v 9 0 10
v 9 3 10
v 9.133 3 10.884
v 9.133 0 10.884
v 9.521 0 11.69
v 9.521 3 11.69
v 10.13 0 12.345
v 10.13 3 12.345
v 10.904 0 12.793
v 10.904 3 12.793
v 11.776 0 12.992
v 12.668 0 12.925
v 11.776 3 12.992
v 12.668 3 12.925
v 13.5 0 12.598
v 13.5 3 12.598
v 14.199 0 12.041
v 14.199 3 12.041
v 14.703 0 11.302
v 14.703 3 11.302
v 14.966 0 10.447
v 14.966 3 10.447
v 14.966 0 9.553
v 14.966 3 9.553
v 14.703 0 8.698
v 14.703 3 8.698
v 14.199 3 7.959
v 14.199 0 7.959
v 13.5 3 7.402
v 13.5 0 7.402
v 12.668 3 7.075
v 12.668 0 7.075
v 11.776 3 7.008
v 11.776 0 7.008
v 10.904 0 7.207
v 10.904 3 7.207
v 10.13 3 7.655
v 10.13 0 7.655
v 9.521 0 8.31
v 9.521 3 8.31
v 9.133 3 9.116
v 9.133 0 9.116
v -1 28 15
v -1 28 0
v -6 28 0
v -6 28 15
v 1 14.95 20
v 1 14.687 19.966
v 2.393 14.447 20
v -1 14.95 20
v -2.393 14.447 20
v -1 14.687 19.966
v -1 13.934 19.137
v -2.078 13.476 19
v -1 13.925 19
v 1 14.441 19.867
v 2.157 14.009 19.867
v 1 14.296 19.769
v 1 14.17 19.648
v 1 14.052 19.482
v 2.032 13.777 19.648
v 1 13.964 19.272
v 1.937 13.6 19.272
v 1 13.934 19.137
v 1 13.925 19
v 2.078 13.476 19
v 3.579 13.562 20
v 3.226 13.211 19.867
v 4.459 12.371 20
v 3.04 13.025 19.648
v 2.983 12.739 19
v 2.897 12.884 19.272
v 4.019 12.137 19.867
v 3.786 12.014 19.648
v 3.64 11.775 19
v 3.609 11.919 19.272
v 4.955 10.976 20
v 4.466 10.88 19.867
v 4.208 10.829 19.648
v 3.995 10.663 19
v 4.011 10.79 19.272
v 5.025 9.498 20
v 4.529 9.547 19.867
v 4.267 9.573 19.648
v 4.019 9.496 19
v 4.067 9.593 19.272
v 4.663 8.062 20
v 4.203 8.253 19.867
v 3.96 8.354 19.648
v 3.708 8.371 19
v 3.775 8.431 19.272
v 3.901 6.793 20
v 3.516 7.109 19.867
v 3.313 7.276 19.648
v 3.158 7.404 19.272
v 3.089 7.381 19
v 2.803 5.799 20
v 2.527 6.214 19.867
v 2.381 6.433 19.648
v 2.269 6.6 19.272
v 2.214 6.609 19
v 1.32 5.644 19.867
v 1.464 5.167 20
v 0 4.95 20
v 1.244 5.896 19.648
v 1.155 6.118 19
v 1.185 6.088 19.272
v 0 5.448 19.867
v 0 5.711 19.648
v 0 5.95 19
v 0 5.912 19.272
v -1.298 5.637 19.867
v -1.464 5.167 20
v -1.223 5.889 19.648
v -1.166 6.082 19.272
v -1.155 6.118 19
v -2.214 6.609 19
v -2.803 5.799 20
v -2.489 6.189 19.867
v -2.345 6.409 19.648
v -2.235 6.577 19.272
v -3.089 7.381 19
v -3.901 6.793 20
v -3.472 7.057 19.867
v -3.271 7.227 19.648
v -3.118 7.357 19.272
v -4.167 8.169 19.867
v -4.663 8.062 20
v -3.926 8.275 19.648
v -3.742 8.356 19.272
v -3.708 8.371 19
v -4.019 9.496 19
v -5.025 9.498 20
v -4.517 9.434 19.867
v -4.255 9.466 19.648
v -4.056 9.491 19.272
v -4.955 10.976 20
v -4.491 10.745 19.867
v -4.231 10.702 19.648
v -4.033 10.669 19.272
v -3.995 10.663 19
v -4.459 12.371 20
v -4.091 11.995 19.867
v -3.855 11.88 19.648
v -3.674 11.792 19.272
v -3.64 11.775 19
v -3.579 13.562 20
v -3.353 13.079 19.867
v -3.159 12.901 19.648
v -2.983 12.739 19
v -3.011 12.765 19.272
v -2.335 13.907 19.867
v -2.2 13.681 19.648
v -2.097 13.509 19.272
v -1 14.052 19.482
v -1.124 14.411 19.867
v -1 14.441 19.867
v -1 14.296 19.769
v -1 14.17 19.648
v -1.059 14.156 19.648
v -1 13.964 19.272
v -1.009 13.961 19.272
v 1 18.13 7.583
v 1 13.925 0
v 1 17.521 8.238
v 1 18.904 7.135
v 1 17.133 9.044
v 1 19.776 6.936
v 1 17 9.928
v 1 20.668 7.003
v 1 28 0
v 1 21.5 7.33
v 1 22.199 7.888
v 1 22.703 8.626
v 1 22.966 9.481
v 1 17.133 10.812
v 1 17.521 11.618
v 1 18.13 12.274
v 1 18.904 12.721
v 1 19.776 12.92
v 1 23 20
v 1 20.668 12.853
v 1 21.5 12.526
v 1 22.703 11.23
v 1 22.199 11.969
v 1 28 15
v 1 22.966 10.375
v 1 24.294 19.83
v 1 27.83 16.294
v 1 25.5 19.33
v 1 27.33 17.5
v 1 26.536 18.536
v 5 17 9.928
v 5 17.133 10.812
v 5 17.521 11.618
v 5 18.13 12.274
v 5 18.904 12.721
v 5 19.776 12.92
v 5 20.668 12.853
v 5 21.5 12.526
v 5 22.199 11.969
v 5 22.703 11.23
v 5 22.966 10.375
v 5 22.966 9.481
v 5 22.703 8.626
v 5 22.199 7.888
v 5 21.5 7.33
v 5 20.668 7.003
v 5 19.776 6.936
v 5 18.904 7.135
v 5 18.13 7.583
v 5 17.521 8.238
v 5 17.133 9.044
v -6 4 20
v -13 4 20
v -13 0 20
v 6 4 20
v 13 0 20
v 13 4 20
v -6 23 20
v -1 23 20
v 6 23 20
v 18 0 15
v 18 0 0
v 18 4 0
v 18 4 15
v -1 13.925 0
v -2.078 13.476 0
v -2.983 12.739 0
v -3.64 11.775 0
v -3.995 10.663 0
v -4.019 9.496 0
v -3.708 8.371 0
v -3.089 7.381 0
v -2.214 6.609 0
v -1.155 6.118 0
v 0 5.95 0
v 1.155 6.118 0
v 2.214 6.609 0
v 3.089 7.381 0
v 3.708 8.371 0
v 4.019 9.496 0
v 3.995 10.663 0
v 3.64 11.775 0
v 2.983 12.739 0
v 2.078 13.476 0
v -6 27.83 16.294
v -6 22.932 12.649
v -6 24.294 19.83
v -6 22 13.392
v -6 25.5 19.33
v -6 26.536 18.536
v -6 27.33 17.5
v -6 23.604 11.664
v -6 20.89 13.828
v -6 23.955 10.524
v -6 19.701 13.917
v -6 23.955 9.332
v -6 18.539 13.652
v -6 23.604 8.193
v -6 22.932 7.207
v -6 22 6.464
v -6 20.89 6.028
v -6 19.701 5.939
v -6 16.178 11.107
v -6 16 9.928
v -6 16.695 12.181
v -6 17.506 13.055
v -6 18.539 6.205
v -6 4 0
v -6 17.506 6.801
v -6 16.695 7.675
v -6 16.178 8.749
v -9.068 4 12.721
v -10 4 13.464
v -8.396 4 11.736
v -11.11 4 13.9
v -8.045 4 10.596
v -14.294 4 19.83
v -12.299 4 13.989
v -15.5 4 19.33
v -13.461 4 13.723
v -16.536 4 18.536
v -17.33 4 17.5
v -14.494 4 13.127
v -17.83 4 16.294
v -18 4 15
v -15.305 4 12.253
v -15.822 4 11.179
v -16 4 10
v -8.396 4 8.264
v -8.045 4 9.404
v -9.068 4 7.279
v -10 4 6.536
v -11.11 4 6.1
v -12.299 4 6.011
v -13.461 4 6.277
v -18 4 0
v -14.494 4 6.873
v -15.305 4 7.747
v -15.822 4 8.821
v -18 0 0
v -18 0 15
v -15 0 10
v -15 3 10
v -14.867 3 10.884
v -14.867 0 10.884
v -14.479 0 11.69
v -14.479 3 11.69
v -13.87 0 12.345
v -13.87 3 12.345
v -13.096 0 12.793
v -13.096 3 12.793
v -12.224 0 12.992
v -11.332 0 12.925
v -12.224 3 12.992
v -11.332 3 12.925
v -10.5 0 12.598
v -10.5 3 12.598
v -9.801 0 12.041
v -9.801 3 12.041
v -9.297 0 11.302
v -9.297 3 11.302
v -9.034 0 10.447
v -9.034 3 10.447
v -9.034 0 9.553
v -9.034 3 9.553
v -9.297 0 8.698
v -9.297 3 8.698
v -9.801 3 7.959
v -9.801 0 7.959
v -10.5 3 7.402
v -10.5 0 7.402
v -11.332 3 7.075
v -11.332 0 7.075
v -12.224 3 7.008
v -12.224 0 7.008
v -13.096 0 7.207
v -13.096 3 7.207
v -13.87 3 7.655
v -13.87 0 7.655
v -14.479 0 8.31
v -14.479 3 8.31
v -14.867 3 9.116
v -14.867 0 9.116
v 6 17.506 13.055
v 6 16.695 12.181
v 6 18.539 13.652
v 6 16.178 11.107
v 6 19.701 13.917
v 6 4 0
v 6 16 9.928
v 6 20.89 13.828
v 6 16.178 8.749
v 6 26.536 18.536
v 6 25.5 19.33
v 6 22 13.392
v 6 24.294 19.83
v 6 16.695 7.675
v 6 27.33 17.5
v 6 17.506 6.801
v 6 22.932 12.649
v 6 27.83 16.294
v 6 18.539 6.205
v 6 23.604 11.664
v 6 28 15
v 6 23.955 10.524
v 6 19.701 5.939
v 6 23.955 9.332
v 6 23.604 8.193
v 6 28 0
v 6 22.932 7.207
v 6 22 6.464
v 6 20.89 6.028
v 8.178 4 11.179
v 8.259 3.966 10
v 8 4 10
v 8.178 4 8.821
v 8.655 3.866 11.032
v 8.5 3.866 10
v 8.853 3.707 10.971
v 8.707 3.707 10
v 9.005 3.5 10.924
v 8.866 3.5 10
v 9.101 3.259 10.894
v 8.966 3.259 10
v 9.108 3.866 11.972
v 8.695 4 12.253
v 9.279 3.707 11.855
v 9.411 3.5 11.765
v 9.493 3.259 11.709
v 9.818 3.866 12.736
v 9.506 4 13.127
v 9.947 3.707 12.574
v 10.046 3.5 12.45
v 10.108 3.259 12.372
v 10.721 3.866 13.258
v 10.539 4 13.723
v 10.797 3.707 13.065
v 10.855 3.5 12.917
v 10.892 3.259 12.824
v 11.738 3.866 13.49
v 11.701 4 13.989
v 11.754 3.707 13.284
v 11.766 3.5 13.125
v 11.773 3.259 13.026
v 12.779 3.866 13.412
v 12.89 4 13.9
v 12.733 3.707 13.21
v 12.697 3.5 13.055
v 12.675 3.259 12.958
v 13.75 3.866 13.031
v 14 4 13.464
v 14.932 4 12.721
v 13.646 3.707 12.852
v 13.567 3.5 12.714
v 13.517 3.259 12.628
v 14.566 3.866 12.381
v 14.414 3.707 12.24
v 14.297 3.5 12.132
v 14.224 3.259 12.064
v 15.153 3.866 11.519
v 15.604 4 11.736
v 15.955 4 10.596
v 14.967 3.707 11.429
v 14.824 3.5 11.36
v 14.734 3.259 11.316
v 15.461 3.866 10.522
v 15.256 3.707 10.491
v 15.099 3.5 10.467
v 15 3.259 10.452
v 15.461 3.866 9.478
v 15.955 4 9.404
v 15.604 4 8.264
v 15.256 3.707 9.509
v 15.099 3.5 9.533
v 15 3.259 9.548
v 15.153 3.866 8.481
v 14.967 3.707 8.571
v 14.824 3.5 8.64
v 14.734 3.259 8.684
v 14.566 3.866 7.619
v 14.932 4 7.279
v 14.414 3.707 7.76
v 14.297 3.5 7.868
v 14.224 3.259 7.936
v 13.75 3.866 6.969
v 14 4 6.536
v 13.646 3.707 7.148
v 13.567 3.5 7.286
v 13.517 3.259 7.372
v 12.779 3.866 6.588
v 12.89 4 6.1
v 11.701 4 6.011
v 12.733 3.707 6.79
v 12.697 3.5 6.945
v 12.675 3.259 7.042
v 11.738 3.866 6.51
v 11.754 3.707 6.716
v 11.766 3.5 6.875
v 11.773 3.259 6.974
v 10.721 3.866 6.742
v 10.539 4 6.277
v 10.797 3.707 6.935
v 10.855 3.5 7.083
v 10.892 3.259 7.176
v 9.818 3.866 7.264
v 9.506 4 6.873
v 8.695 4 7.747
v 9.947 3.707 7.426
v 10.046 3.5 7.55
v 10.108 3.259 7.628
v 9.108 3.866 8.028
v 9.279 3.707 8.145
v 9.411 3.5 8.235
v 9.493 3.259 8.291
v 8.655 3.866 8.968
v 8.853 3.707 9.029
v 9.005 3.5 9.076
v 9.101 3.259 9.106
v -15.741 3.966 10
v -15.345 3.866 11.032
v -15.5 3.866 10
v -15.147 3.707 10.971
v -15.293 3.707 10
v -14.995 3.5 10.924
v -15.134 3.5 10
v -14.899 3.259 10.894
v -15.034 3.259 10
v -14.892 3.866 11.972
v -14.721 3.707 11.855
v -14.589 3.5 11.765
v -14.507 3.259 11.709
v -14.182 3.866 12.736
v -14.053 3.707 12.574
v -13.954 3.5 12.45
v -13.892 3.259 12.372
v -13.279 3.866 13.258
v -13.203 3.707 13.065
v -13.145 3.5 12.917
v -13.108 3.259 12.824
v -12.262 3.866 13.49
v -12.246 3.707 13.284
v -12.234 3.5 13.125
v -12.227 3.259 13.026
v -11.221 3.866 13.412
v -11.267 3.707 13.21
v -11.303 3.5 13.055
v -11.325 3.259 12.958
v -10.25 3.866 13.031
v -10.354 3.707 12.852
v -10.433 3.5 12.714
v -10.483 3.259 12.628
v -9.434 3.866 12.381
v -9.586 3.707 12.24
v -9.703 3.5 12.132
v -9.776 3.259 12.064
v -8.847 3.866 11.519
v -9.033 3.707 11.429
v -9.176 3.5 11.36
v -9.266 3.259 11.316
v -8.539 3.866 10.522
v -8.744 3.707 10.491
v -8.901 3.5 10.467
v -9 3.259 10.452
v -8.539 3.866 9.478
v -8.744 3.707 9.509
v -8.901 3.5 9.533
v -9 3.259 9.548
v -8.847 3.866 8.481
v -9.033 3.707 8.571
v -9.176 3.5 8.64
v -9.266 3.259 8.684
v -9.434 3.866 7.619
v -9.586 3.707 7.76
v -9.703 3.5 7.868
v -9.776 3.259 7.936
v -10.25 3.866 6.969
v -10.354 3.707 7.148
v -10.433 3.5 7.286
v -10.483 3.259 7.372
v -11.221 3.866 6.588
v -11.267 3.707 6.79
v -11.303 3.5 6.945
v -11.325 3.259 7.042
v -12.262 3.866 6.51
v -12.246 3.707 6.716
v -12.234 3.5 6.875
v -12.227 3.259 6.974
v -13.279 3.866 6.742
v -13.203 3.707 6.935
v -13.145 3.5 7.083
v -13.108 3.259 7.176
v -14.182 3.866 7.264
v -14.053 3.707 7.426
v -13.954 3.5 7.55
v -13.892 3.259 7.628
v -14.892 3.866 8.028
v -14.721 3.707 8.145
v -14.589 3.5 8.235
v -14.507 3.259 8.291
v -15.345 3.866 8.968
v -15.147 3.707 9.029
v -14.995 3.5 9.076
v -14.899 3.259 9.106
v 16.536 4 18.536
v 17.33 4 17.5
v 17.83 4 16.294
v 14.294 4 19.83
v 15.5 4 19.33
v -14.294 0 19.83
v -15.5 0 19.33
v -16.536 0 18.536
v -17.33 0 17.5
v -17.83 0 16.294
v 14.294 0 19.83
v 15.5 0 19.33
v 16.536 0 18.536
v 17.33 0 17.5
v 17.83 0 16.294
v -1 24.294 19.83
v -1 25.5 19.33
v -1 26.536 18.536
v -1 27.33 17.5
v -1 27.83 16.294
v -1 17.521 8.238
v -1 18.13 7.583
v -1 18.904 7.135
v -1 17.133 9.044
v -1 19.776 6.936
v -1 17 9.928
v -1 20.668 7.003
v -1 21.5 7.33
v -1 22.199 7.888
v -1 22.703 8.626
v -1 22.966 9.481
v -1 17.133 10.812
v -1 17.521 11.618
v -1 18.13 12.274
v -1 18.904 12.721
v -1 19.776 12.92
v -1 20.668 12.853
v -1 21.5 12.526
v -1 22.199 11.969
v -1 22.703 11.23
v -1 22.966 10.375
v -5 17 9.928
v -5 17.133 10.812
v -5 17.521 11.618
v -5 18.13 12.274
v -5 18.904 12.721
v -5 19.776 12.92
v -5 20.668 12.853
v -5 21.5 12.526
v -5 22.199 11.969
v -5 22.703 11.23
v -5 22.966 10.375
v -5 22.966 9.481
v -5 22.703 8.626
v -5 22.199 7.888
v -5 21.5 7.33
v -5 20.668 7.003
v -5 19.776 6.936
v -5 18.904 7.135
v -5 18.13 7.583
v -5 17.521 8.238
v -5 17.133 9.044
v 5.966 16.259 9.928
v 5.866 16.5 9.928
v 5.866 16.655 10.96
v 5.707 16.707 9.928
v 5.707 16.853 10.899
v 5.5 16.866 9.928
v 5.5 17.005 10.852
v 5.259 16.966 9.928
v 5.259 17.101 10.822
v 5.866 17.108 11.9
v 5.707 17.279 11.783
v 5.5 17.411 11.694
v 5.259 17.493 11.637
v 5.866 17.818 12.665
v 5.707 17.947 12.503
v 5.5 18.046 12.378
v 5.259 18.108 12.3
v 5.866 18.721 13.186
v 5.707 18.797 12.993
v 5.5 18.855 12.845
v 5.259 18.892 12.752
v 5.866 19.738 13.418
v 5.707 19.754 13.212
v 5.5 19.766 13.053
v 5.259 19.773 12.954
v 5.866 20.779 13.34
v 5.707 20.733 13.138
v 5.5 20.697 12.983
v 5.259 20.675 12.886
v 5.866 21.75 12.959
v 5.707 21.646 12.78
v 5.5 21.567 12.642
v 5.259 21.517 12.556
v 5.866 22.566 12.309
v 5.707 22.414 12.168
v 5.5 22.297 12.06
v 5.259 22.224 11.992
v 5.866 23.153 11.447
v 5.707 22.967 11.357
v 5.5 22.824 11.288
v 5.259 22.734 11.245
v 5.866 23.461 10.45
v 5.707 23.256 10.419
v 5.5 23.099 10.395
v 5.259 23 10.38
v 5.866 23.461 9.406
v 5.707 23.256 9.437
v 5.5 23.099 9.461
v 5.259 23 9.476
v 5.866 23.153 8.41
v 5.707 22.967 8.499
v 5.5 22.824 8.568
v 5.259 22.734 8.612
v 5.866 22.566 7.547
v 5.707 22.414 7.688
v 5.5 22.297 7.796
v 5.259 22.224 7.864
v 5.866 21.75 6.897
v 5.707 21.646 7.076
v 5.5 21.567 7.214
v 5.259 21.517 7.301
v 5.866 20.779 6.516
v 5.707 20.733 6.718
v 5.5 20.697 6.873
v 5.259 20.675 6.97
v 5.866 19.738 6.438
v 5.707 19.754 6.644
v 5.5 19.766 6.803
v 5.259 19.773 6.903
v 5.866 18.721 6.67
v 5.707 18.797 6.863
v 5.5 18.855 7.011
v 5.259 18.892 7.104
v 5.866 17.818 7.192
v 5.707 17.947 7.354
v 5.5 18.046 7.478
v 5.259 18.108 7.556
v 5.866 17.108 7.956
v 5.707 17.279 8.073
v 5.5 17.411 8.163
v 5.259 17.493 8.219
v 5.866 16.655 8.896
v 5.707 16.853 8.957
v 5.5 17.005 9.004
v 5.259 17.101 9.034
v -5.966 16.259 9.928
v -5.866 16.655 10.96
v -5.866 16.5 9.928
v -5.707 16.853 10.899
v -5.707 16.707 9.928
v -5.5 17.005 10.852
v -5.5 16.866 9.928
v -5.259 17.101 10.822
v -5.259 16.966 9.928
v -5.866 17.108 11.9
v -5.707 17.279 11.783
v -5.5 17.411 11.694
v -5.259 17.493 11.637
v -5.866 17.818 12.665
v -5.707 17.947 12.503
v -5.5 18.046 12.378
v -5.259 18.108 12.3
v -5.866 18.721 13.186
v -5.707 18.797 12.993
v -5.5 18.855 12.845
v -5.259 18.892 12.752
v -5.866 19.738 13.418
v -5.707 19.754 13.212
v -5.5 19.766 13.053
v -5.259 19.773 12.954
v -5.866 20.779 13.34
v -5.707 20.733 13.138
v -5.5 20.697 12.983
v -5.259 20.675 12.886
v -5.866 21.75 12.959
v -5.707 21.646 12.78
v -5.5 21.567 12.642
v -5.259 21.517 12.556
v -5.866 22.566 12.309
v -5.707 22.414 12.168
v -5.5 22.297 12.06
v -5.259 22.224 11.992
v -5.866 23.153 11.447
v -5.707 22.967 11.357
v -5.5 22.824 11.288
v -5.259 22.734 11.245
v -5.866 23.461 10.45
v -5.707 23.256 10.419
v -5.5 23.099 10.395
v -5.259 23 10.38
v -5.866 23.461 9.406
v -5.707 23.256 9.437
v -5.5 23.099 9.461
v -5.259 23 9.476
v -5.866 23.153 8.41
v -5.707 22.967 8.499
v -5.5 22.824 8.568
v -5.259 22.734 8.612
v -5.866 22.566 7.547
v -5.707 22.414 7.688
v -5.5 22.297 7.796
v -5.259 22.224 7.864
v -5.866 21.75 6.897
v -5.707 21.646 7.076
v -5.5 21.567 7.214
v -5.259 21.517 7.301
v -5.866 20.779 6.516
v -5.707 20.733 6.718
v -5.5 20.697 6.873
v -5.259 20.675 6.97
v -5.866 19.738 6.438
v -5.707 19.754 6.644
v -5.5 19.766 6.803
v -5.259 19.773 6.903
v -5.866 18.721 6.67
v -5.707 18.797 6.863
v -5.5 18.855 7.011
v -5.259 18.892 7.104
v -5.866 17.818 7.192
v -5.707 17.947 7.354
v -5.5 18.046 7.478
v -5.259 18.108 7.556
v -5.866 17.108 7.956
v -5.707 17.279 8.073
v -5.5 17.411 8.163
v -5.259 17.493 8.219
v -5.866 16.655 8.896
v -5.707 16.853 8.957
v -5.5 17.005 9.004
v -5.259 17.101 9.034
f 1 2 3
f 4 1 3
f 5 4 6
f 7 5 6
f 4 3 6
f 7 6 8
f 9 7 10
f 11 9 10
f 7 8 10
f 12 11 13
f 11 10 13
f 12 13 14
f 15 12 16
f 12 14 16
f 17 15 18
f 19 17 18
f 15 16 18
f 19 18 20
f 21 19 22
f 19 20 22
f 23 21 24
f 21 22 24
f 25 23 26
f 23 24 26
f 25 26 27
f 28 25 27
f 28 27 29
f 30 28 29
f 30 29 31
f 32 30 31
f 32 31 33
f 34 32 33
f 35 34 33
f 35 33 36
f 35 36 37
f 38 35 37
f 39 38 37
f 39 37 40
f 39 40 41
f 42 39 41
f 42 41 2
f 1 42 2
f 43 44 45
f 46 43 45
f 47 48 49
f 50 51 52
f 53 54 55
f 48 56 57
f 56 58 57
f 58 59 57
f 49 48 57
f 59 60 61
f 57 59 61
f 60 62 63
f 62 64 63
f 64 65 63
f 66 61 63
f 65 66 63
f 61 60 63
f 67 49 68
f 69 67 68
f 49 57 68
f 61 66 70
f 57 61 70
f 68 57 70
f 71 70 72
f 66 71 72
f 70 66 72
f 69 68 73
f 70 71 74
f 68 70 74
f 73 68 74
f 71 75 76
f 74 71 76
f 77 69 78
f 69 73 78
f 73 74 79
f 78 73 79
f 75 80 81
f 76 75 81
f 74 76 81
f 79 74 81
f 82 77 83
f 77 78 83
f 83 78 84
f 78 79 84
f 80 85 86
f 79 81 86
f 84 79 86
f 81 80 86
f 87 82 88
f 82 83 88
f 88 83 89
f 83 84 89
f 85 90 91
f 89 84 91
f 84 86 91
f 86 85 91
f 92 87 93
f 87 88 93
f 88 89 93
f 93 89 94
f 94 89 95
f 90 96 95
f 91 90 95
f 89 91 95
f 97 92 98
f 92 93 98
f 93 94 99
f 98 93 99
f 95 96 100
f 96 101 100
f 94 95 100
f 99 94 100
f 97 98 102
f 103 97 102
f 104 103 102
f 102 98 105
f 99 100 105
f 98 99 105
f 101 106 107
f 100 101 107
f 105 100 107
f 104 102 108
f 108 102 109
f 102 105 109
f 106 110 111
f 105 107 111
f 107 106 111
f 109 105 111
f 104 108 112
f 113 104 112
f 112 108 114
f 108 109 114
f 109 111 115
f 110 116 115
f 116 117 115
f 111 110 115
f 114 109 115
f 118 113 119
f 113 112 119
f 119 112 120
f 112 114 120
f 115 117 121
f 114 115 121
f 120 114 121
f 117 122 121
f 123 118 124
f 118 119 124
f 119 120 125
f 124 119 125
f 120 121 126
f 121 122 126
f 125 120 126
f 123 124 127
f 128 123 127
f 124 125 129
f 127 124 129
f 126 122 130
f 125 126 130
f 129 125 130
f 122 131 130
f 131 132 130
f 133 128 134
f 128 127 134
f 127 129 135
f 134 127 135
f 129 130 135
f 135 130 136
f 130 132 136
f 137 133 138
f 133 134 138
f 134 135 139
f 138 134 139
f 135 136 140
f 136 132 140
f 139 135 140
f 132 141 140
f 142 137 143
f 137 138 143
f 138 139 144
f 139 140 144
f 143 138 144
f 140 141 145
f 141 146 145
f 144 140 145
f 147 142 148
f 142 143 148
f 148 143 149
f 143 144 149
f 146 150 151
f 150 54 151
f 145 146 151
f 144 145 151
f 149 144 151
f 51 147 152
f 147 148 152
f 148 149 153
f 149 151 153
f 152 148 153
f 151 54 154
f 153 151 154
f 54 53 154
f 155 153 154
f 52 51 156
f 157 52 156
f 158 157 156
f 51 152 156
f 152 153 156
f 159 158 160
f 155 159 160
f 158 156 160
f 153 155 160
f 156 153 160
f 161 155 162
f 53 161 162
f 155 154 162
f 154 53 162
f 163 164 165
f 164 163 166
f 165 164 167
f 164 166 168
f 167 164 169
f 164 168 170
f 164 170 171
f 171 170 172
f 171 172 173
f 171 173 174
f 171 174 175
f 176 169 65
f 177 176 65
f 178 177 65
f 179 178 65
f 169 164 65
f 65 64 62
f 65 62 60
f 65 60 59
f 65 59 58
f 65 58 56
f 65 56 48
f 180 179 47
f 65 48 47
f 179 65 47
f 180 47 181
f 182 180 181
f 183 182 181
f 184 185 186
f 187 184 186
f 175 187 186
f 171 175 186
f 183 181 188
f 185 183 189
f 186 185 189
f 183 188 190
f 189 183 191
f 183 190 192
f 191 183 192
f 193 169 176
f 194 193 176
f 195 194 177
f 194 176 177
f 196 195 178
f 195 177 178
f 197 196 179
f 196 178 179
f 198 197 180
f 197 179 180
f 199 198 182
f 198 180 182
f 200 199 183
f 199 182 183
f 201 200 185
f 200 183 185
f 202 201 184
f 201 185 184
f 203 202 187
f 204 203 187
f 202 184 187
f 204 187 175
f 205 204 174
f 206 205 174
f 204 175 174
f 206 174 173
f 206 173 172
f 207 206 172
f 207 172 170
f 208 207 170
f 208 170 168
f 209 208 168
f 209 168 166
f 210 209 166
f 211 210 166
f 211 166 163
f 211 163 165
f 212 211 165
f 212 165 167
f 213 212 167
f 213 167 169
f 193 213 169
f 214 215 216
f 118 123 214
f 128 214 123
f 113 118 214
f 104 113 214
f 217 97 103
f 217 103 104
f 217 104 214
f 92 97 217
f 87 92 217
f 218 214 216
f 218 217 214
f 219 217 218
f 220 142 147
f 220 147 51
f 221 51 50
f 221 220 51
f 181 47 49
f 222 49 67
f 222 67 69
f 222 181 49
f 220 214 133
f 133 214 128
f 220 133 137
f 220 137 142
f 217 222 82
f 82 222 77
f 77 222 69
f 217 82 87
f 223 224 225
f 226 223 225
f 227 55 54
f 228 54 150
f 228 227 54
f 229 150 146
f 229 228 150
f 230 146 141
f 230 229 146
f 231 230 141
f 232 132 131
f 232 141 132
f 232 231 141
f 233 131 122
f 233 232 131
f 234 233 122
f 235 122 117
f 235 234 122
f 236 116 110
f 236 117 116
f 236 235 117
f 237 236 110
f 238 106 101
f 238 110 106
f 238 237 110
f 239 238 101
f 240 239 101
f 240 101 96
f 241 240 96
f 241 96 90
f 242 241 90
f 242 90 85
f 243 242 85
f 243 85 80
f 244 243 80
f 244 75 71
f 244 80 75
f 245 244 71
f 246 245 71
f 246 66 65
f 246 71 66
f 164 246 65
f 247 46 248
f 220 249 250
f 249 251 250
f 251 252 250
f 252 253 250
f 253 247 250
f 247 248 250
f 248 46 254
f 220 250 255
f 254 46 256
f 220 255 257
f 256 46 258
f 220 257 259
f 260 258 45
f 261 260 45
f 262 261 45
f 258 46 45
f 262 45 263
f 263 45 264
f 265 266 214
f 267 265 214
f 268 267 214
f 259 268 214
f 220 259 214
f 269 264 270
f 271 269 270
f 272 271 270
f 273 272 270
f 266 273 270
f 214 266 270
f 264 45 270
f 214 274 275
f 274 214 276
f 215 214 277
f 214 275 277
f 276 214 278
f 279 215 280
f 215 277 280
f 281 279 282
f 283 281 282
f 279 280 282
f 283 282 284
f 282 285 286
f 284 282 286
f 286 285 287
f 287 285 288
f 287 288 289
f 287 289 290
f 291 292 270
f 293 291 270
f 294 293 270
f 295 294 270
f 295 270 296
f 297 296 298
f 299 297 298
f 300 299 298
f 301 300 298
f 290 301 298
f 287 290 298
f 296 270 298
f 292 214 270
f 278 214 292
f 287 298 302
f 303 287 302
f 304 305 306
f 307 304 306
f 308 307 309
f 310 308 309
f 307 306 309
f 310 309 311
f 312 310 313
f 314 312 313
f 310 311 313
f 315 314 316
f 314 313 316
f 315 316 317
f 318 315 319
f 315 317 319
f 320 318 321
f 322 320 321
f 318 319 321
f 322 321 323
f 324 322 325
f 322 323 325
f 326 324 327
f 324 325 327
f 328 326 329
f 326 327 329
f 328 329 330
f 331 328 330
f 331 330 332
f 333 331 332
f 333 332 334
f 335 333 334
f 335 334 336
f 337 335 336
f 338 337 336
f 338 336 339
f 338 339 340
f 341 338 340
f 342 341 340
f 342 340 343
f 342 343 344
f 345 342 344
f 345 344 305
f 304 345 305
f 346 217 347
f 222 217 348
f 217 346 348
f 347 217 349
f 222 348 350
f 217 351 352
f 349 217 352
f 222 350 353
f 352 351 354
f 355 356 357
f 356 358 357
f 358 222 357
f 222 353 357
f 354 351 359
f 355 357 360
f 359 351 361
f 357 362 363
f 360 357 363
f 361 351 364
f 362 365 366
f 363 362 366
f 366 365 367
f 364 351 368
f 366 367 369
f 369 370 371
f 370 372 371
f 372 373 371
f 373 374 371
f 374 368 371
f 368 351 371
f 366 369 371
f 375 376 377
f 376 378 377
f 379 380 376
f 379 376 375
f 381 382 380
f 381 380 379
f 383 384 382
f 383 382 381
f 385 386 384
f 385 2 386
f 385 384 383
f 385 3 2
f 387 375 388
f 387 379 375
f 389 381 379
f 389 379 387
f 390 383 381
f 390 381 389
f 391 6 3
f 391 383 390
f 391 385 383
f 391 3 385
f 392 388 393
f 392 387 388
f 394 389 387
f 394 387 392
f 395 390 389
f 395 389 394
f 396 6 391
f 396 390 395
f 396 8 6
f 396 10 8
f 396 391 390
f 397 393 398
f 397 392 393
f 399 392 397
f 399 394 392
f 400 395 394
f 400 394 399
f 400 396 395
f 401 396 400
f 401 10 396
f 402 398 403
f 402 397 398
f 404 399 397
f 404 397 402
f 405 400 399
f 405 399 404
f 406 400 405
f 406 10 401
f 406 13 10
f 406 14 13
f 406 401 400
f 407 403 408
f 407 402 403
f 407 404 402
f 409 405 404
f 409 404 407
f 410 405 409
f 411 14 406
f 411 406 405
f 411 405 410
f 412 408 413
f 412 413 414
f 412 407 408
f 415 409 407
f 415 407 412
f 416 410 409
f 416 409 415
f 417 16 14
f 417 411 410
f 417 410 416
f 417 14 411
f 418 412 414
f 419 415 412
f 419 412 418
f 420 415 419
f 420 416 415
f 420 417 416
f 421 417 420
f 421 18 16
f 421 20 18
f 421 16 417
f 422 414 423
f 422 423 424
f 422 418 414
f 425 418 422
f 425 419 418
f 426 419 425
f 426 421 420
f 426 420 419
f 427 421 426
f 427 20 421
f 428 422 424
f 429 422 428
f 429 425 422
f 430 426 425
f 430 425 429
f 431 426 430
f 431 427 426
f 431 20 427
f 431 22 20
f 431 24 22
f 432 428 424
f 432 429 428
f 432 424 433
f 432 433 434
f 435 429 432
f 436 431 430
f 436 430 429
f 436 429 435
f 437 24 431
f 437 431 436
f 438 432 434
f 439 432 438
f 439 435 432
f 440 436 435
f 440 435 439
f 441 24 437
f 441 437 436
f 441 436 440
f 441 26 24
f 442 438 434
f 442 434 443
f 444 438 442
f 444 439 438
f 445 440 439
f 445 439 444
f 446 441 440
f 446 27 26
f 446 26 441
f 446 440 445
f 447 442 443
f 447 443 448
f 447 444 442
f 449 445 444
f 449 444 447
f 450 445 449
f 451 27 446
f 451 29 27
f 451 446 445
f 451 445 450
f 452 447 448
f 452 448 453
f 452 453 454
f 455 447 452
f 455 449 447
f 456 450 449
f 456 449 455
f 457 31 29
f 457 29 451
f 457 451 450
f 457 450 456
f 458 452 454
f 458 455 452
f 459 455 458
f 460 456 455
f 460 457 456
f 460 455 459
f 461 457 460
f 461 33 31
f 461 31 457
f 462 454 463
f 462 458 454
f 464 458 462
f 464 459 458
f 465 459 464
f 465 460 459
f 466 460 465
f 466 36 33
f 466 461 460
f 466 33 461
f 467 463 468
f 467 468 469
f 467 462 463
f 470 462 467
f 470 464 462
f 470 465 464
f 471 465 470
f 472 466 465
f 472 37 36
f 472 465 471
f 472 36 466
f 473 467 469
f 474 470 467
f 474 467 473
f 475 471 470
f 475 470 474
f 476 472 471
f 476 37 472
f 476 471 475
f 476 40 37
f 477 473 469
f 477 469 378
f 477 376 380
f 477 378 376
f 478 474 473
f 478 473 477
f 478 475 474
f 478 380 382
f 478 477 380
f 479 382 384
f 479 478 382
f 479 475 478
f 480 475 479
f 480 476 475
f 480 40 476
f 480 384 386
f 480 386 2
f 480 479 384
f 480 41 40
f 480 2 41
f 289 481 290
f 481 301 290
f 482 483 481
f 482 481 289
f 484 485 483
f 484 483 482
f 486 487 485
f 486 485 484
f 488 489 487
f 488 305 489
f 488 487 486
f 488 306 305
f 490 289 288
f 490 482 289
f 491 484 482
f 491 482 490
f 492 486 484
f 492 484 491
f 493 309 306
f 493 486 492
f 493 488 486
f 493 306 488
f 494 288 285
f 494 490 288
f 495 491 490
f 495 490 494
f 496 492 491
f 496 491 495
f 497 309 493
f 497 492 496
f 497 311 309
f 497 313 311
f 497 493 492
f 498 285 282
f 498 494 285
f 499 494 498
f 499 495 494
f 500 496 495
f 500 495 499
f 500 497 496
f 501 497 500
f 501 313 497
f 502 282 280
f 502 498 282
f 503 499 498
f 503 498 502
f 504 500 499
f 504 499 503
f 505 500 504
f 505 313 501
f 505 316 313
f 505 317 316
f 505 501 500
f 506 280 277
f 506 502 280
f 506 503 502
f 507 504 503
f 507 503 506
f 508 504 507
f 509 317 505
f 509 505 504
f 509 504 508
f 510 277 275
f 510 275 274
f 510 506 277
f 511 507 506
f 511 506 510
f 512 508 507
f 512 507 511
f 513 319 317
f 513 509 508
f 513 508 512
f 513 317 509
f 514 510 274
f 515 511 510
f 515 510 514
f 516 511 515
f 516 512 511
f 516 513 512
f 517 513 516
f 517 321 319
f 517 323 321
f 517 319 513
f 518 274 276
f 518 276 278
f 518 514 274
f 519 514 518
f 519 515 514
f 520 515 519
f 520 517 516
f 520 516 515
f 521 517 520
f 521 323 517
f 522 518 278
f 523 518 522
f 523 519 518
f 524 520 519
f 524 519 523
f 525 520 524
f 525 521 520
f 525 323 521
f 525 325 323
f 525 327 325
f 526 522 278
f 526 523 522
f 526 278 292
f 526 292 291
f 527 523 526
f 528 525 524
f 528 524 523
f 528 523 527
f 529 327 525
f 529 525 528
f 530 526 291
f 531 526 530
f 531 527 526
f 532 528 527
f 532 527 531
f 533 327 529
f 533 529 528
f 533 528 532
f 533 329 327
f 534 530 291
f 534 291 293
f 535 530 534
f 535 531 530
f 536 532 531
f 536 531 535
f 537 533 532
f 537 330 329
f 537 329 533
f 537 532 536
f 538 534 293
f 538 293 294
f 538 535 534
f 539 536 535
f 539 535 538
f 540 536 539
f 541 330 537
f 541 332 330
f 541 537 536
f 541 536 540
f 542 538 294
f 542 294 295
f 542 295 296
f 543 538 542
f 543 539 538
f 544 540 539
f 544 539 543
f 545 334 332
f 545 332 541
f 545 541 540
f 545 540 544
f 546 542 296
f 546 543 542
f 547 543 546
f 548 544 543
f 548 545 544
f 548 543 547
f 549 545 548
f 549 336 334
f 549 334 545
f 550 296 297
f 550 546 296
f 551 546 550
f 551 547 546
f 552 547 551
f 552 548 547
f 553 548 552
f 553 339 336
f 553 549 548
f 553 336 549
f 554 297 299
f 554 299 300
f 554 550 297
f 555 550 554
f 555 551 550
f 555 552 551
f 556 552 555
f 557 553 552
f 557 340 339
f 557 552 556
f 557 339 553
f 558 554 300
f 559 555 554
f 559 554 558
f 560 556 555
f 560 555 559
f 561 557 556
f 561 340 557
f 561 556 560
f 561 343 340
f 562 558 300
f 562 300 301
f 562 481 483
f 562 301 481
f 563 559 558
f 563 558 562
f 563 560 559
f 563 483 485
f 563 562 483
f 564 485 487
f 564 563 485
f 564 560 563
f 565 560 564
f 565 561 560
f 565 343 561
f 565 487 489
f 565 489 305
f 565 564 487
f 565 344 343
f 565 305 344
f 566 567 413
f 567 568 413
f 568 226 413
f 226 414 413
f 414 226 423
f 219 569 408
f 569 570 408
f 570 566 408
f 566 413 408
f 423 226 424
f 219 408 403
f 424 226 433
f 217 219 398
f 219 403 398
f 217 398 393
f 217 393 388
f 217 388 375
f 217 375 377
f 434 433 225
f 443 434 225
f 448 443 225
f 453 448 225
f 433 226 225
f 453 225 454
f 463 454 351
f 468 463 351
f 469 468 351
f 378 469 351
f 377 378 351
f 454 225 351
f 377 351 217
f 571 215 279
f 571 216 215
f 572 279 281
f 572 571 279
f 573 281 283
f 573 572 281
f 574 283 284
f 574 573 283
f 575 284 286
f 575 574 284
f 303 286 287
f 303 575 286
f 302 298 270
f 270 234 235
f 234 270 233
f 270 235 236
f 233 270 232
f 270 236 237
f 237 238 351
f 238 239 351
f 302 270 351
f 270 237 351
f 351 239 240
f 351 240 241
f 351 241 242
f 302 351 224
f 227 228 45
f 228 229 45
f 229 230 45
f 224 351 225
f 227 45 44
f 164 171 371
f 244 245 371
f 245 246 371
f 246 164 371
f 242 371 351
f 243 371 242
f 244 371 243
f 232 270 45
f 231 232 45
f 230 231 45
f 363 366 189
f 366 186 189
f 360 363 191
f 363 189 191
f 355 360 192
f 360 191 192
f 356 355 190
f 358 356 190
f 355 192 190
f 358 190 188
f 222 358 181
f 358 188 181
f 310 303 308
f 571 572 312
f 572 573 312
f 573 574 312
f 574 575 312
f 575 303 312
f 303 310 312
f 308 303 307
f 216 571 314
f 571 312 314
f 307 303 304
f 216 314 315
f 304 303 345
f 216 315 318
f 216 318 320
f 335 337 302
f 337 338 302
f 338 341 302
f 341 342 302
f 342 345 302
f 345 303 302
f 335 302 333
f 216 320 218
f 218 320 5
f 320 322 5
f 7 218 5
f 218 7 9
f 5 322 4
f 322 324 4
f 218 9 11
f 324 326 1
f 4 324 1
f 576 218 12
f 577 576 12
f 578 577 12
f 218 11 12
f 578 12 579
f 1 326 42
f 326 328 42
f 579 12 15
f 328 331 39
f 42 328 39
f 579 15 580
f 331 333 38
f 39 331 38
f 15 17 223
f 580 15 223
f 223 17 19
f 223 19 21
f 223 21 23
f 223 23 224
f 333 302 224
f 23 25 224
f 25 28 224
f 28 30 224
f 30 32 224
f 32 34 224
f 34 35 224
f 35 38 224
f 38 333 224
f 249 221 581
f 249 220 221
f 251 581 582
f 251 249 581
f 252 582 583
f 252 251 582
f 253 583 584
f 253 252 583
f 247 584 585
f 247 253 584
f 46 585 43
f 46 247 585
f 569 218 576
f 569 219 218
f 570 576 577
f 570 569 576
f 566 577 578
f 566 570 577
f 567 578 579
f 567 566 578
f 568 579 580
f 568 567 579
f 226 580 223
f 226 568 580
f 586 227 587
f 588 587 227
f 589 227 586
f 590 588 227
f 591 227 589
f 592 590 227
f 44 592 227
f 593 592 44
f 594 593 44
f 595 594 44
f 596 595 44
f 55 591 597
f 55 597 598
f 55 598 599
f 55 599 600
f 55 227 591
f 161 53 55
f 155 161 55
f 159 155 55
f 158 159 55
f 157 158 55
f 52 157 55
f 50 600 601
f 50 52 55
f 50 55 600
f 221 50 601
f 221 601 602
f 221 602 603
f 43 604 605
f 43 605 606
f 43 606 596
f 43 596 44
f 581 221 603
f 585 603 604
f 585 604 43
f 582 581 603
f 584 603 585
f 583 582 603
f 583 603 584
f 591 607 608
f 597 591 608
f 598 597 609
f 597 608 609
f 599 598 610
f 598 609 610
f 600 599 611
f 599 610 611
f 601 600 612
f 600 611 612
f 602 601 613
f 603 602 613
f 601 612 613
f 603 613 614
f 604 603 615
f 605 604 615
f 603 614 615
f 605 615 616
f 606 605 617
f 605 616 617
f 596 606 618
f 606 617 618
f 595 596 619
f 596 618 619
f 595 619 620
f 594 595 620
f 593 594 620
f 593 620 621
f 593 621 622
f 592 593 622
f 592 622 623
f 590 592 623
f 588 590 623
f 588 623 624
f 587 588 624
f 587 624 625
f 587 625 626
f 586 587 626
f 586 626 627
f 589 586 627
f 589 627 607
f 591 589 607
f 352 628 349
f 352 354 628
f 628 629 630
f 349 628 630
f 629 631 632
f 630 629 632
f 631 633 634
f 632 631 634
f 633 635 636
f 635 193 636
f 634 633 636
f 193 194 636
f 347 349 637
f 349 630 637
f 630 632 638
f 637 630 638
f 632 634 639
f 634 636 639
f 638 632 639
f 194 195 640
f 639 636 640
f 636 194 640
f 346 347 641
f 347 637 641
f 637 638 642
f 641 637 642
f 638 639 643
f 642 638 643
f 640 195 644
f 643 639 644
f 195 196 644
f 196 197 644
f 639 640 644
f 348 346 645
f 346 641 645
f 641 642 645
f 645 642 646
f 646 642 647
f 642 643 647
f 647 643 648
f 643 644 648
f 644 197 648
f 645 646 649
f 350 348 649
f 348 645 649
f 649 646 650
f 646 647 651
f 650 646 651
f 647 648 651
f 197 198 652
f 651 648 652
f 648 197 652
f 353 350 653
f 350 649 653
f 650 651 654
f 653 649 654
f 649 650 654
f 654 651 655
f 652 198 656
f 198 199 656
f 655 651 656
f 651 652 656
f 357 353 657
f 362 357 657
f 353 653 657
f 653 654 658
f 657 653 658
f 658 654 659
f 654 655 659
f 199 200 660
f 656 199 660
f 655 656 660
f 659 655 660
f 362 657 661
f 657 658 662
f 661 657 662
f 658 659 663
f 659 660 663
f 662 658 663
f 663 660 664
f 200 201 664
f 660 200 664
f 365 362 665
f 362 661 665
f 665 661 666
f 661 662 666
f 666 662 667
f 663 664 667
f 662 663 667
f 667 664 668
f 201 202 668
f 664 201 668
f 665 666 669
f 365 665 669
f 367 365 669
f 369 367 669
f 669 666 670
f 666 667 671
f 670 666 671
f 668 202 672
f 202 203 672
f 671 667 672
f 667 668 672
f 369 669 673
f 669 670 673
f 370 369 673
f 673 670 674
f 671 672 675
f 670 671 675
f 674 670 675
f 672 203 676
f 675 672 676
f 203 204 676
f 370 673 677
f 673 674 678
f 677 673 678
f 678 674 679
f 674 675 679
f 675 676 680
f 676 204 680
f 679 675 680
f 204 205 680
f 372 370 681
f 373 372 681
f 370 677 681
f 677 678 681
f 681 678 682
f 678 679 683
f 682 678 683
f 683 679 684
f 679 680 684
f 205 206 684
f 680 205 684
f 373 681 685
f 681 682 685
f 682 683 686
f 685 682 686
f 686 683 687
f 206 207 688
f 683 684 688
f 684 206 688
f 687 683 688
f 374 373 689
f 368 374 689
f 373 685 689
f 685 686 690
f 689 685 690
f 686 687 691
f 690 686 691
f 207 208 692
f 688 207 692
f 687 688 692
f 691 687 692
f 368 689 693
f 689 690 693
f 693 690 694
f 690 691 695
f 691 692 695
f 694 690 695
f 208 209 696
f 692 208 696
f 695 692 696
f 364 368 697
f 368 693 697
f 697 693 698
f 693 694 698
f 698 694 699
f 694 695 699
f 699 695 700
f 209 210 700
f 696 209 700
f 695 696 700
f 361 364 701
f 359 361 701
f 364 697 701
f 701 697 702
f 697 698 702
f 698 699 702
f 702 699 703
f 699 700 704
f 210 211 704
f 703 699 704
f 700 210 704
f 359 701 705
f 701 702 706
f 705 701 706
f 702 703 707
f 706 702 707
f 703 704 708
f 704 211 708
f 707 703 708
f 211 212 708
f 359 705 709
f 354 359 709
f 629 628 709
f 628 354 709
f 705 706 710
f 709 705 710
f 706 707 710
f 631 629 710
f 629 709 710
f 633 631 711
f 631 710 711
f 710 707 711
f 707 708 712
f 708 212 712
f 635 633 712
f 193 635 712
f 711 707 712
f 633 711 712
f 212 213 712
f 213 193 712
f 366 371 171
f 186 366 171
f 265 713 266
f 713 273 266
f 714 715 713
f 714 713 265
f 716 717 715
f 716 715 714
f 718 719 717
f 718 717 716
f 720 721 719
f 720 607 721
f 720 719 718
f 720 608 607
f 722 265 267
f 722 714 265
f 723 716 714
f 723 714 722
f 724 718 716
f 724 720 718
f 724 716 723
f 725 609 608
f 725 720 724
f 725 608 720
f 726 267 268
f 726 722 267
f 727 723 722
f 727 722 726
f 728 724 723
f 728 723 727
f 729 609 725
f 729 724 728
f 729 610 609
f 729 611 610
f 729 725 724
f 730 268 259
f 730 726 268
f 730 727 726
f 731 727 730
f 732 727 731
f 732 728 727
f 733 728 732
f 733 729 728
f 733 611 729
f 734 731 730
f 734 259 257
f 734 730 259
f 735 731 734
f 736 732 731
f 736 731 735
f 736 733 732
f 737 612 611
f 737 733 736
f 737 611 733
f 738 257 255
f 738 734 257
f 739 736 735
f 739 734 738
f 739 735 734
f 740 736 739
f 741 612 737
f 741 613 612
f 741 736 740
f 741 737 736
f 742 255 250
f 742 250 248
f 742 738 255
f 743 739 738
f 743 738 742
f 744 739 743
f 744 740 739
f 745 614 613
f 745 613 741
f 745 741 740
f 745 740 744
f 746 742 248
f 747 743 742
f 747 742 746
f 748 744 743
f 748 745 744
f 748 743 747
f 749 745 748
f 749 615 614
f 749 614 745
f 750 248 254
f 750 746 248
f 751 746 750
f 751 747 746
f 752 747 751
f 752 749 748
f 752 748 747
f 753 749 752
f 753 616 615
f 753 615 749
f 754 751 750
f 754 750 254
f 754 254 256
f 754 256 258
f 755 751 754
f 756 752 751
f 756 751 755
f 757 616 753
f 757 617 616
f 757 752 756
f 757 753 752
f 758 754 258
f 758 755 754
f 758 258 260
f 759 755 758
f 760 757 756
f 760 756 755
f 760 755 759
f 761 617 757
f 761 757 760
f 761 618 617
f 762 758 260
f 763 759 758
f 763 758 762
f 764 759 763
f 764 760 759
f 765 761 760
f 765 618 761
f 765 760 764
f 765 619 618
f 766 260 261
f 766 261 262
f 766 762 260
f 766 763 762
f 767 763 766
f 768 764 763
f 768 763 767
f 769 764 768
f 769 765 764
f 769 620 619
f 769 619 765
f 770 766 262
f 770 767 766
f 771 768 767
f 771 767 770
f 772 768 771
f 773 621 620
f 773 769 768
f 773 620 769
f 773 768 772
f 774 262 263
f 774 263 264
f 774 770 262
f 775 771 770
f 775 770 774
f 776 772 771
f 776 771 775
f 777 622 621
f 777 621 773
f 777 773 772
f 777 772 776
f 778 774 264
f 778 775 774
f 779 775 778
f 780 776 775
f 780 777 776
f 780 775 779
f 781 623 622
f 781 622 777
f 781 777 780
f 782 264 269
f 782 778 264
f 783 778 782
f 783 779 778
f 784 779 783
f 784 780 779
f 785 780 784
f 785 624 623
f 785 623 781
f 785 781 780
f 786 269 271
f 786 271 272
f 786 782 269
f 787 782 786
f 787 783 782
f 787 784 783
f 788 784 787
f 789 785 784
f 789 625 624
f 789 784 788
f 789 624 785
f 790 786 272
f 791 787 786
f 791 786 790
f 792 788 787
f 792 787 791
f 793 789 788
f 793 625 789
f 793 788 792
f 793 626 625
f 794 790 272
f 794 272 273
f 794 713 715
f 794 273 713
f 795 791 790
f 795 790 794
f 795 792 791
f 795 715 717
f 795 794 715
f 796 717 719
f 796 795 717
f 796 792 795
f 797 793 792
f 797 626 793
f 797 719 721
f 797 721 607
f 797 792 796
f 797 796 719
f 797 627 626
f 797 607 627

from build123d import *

# Parameters (mm, degrees)
F0_R     = 4.05
F1_DEPTH = 20
F2_W     = 2
F2_H     = 25.5416983529
F3_DEPTH = 25
F4_R     = 3
F5_DEPTH = 25
F6_R     = 3
F7_DEPTH = 25
F8_R     = 5
F9_R     = 1


with BuildPart() as f1:
    # F0 (on Top) → F1 (new body)
    with BuildSketch(Plane.XY):
        Polygon((6, 28), (0, 28), (-6, 28), (-6, 4), (-18, 4), (-18, 0), (0, 0), (18, 0), (18, 4), (6, 4), align=None)
        with Locations((0, 10)):
            Circle(F0_R, mode=Mode.SUBTRACT)
    extrude(amount=F1_DEPTH)

    # F2 (on face) → F3 (cut)
    with BuildSketch(Plane.XY.offset(20)):
        with Locations((0, 21.3338027536)):
            Rectangle(F2_W, F2_H)
    extrude(amount=-F3_DEPTH, mode=Mode.SUBTRACT)

    # F4 (on face) → F5 (cut)
    with BuildSketch(Plane(origin=(-6, 0, 0), x_dir=(0, -1, 0), z_dir=(-1, 0, 0))):
        with Locations((-20, 9.9280960858)):
            Circle(F4_R)
    extrude(amount=-F5_DEPTH, mode=Mode.SUBTRACT)

    # F6 (on face) → F7 (cut)
    with BuildSketch(Plane(origin=(0, 4, 0), x_dir=(-1, 0, 0), z_dir=(0, 1, 0))):
        with Locations((12, 10)):
            Circle(F6_R)
        with Locations((-12, 10)):
            Circle(F6_R)
    extrude(amount=-F7_DEPTH, mode=Mode.SUBTRACT)

    # F8
    f8_edges = [f1.edges().sort_by_distance(p)[0] for p in [
        (3.5, 28, 20),
        (-3.5, 28, 20),
        (-18, 2, 20),
        (18, 2, 20),
    ]]
    fillet(f8_edges, radius=F8_R)

    # F9
    f9_edges = [f1.edges().sort_by_distance(p)[0] for p in [
        (0, 5.95, 20),
        (-9, 4, 10),
        (15, 4, 10),
        (-6, 23, 9.928096),
        (6, 23, 9.928096),
    ]]
    fillet(f9_edges, radius=F9_R)


solid = f1.part
